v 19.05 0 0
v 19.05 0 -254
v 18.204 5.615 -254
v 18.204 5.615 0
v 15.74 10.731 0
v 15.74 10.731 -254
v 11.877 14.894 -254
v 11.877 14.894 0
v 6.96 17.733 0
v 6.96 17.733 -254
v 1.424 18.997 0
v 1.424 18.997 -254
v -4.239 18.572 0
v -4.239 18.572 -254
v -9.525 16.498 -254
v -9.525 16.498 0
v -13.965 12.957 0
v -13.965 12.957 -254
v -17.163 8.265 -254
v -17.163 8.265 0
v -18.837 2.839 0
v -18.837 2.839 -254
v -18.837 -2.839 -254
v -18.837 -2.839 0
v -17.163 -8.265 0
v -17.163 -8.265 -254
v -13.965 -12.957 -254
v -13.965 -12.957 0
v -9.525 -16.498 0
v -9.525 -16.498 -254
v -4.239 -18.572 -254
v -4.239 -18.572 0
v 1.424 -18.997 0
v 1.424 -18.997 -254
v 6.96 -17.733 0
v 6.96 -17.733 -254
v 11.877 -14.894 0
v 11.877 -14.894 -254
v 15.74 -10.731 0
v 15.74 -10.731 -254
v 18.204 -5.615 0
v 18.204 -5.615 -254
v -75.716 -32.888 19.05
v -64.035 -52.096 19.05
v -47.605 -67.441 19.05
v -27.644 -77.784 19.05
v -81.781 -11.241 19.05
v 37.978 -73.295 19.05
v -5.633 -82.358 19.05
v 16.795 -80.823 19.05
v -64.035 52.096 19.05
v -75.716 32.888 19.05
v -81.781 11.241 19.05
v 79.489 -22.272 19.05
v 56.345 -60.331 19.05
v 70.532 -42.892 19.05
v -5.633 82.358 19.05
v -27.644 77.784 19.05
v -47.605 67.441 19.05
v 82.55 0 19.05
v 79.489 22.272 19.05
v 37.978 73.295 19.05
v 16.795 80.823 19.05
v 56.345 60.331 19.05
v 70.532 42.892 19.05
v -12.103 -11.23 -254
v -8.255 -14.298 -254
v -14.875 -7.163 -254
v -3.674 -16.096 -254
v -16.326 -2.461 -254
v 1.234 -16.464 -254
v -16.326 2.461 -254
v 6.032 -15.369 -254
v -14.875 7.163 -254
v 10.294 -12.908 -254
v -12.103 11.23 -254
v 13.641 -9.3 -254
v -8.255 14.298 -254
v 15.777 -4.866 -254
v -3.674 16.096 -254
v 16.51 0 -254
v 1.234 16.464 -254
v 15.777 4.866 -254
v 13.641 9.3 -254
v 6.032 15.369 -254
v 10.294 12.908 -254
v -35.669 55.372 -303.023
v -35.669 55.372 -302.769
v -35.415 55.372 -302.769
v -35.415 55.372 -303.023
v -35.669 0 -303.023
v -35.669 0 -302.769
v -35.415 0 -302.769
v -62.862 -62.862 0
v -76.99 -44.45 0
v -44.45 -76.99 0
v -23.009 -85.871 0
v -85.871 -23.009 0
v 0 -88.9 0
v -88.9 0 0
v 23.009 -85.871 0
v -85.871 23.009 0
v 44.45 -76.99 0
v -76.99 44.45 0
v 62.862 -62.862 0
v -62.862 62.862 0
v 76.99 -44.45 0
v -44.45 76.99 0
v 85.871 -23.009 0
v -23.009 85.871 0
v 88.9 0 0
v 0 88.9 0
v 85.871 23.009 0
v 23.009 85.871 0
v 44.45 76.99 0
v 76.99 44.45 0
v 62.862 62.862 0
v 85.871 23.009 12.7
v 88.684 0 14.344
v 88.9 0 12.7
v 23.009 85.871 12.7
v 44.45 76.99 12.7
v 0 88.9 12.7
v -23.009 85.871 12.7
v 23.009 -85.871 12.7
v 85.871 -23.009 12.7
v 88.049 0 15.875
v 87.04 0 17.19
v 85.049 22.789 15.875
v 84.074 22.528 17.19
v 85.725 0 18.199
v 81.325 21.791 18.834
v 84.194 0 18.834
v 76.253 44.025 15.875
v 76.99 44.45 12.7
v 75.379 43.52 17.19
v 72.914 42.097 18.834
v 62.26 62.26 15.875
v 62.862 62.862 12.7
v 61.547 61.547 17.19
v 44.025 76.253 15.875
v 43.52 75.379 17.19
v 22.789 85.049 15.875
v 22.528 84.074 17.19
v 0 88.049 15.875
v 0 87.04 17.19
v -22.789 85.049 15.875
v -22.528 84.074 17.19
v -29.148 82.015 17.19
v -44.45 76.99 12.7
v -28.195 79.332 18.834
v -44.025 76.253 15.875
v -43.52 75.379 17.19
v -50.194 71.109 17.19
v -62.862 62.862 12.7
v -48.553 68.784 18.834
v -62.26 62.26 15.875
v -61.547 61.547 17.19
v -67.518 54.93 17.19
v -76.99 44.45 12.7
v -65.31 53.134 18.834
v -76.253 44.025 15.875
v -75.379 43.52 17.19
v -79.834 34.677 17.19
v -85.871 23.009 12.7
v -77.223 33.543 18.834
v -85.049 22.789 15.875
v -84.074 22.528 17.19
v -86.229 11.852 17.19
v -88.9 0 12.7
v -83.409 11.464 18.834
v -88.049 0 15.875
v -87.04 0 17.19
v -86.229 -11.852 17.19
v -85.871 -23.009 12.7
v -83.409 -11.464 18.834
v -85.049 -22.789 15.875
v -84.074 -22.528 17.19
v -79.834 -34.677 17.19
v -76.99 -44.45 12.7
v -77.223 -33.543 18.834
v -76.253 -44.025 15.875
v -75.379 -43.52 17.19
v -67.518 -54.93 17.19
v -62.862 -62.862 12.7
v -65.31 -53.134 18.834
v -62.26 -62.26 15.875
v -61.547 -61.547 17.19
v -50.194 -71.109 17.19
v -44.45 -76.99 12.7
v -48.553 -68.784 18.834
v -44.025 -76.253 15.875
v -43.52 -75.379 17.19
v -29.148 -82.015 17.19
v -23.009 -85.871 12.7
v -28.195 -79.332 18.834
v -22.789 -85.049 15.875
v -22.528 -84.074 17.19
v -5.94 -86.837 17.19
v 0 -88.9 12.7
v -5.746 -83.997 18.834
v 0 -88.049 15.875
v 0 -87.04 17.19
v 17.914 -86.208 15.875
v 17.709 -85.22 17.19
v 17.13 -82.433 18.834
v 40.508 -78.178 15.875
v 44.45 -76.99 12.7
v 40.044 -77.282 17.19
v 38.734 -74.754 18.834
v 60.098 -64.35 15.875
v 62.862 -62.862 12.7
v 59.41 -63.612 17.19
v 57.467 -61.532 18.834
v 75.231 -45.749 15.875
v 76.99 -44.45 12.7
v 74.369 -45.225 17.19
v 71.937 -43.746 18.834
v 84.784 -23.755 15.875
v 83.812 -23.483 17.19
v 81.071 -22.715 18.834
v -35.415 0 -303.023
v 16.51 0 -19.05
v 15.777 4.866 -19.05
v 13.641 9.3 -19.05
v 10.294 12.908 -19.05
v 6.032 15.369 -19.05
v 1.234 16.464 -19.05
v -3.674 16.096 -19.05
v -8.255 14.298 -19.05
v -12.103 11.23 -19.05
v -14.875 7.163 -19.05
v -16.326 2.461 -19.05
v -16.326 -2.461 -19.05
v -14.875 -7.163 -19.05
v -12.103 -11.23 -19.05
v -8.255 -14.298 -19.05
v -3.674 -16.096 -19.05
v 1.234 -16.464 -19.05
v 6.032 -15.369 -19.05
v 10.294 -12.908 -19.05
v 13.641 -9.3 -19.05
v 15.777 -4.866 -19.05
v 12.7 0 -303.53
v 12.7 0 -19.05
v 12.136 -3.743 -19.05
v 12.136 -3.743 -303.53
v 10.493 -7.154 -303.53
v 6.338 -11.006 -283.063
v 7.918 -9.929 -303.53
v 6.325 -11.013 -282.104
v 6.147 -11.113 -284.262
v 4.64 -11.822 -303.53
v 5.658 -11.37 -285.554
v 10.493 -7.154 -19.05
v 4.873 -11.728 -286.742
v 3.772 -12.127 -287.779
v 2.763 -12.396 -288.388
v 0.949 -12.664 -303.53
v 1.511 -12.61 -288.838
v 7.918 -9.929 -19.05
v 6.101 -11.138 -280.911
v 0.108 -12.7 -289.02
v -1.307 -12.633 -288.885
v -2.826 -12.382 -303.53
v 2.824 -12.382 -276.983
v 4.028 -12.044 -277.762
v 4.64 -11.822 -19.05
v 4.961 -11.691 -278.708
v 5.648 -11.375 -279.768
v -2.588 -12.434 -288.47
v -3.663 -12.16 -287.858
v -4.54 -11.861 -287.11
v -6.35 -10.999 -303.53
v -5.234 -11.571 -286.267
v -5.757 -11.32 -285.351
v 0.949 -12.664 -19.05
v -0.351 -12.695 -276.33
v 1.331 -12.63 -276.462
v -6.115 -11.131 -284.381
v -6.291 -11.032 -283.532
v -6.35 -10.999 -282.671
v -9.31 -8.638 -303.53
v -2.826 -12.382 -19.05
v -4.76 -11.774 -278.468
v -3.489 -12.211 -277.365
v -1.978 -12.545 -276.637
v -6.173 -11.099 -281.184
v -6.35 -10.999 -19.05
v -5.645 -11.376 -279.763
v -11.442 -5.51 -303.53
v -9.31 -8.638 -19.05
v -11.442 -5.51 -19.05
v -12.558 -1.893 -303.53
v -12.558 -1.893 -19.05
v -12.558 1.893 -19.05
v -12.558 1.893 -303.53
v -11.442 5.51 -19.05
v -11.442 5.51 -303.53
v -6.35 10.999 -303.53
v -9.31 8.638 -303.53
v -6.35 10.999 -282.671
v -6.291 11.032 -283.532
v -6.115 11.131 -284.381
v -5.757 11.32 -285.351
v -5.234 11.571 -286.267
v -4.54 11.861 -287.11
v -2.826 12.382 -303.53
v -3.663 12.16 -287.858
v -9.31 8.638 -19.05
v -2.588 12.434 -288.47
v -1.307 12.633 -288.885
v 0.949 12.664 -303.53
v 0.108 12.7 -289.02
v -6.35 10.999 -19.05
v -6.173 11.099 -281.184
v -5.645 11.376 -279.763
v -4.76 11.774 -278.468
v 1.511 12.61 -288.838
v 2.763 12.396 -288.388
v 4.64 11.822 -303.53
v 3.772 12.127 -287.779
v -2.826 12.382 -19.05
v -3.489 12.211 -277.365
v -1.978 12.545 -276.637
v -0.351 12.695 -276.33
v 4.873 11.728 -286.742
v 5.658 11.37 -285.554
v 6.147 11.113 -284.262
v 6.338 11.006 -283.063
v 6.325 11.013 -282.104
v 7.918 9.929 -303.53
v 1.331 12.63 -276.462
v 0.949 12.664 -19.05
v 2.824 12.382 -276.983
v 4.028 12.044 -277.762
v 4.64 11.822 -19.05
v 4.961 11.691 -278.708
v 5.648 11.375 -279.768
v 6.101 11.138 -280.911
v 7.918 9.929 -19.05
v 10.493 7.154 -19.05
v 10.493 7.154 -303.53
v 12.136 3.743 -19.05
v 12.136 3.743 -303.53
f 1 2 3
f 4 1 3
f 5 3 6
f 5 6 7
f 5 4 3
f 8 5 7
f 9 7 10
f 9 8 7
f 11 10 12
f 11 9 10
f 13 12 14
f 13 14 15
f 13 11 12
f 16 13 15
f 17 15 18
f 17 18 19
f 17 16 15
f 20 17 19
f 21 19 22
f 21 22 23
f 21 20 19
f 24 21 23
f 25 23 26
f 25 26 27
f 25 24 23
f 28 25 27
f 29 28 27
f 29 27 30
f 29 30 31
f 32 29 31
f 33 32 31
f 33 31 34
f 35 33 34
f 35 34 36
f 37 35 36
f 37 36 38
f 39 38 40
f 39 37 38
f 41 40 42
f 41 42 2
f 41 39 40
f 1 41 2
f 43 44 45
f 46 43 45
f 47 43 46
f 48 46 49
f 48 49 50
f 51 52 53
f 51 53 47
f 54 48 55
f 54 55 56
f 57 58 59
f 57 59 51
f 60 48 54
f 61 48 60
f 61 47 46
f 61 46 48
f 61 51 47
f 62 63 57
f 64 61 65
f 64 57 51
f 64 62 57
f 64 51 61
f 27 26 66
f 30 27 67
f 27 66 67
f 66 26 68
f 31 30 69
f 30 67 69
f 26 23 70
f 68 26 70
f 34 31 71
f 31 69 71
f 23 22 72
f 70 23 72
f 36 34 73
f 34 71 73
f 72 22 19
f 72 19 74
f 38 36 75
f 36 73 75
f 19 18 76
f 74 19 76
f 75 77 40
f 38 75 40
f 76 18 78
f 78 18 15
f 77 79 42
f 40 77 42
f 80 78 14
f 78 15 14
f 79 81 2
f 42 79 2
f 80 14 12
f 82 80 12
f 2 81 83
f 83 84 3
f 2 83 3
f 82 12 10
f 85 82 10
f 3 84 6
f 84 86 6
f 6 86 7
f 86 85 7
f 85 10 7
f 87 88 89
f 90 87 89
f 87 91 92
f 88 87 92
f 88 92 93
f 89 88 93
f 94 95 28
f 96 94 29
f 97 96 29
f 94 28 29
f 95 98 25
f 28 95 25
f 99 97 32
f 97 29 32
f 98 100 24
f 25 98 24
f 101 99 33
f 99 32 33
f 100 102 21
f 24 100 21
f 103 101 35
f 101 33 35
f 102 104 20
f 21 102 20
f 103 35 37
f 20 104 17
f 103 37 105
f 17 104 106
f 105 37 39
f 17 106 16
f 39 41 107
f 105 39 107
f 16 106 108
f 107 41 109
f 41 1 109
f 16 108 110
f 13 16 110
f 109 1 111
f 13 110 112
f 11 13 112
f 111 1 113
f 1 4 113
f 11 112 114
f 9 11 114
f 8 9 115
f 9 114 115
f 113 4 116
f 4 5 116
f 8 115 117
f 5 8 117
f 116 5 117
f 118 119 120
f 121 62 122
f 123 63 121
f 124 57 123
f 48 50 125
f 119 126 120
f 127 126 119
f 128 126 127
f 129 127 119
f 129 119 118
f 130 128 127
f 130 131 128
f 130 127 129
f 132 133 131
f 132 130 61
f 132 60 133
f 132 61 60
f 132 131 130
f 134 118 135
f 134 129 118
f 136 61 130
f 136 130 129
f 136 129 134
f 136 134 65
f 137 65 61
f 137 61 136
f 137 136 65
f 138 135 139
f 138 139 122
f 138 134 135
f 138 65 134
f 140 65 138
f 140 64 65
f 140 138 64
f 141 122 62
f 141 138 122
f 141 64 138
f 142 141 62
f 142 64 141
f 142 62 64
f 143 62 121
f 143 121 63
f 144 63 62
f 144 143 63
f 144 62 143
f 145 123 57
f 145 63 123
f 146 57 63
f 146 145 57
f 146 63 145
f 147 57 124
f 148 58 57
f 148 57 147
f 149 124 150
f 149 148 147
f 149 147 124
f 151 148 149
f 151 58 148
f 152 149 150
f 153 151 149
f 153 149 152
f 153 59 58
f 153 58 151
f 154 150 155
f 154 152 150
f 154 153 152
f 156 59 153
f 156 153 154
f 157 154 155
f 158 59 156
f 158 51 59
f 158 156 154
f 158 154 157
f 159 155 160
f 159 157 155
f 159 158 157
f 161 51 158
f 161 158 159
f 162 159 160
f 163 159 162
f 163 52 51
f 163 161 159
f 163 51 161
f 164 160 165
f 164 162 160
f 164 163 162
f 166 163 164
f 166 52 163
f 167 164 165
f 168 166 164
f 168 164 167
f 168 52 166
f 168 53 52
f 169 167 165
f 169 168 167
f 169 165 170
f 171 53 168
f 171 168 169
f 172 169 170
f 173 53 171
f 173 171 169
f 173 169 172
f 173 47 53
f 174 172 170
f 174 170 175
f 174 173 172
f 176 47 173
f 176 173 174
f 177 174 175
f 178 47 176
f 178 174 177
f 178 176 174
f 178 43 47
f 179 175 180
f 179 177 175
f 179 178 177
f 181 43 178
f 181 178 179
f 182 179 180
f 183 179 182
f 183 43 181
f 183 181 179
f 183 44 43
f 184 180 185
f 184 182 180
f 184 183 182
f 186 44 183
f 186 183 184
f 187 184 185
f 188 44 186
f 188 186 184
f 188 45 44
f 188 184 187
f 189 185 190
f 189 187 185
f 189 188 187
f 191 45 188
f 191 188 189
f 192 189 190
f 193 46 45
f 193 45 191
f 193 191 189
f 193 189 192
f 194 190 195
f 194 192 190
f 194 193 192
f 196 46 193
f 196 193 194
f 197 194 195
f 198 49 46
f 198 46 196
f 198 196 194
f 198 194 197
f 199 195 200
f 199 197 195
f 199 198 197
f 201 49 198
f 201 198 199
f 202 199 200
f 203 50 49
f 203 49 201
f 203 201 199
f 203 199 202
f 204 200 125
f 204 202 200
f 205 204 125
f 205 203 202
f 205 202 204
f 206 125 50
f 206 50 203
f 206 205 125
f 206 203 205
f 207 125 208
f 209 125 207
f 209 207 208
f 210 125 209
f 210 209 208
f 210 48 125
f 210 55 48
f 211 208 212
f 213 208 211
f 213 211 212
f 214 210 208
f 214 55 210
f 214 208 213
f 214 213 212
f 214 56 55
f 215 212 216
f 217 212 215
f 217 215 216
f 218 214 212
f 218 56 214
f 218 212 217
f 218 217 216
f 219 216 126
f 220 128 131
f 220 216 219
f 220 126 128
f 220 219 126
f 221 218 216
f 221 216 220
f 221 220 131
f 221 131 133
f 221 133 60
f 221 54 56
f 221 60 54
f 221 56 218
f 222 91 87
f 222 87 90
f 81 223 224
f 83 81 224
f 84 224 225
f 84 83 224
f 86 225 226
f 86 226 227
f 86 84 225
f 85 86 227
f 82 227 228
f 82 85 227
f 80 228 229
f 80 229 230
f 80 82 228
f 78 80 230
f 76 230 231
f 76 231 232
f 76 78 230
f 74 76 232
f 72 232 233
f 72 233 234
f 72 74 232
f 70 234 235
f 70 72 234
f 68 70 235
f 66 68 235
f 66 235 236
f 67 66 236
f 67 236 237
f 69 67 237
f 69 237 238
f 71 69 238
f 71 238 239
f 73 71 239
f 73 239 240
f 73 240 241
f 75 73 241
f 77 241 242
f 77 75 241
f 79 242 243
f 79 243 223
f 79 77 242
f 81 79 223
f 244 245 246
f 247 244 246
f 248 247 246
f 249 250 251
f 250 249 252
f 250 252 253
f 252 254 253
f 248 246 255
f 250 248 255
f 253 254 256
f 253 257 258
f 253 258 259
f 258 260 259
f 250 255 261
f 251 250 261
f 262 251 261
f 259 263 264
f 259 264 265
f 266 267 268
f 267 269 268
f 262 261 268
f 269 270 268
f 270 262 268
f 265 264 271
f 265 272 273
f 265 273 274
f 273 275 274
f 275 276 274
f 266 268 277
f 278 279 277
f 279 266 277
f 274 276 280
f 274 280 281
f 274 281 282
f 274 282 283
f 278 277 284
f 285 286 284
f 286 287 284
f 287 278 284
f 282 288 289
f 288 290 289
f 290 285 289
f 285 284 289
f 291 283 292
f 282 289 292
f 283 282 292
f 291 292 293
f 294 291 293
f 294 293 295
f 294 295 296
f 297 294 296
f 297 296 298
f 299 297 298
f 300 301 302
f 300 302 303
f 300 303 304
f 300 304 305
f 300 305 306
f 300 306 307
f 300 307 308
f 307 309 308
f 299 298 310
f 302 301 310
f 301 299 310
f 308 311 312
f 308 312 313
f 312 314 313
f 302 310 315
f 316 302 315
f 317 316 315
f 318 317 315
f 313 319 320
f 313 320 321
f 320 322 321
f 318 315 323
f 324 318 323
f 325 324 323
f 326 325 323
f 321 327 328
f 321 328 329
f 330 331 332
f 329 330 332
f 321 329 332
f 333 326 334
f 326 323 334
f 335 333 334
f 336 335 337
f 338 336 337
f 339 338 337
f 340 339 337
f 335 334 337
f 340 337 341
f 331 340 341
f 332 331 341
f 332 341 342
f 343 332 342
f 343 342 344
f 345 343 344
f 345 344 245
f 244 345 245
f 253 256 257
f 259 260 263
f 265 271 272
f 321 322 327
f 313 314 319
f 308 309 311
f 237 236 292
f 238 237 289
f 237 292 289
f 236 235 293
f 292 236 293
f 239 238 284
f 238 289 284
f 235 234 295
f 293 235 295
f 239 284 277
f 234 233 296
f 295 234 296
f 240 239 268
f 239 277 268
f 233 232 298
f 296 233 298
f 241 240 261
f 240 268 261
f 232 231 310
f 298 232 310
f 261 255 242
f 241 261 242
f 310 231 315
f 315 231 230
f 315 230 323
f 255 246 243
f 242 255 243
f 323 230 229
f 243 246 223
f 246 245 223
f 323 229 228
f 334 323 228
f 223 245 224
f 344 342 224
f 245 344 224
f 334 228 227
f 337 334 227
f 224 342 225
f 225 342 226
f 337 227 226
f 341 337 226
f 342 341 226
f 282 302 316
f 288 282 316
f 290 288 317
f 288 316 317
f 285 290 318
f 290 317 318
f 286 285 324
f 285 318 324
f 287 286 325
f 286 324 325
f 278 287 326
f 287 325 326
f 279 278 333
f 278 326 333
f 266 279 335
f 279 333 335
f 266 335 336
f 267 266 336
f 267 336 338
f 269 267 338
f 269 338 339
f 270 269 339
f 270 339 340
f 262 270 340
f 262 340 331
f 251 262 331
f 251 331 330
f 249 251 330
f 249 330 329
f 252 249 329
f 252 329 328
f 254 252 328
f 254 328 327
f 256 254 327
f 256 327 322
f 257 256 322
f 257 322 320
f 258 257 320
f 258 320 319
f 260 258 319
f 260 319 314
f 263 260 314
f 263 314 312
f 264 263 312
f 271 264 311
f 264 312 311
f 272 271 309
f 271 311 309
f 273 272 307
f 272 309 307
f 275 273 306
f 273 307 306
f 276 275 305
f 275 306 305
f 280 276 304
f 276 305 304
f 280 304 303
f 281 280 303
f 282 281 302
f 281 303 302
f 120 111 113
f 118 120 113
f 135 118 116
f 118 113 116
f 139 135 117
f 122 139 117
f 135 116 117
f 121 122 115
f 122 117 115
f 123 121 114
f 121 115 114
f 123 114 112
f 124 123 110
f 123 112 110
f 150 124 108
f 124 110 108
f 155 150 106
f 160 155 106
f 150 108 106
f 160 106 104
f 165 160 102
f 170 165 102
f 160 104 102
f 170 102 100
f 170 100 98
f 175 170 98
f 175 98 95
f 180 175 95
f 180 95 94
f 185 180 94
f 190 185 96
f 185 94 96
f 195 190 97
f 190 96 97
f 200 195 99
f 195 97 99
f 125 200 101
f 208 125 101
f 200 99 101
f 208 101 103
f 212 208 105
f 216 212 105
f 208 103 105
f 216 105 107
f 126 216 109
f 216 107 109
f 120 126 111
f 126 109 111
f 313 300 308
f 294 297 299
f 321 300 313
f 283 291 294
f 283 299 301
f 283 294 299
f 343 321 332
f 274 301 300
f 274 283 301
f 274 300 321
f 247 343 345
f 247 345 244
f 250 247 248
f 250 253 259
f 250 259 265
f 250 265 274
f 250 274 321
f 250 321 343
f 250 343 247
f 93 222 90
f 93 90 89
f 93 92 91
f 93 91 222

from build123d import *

# Parameters (mm, degrees)
F0_R          = 88.9
F0_R_2        = 19.05
F1_DEPTH      = 19.05
F0_R_3        = 16.51
F2_DEPTH      = 254
F2_DEPTH_BACK = 19.05
F3_R          = 6.35
F4_DEPTH      = 19.05
F4_DEPTH_BACK = 19.05
F5_R          = 12.7
F6_DEPTH      = 284.48
F7_W          = 0.254
F7_H          = 0.254
F8_DEPTH      = 55.372
F9_R          = 6.35
F10_DEPTH     = 144.273


with BuildPart() as f1:
    # F0 (on Top) → F1 (new body)
    with BuildSketch(Plane.XY):
        Circle(F0_R)
        Circle(F0_R_2, mode=Mode.SUBTRACT)
    extrude(amount=F1_DEPTH)

    # F0 (on Top) → F2 (join, two sides)
    with BuildSketch(Plane.XY) as f2_sk:
        Circle(F0_R_2)
        Circle(F0_R_3, mode=Mode.SUBTRACT)
    extrude(amount=-F2_DEPTH)
    extrude(f2_sk.sketch, amount=F2_DEPTH_BACK)

    # F3
    f3_edges = [f1.edges().sort_by_distance(p)[0] for p in [
        (-88.9, 0, 19.05),
    ]]
    fillet(f3_edges, radius=F3_R)

    # F0 (on Top) → F4 (join, two sides)
    with BuildSketch(Plane.XY) as f4_sk:
        Circle(F0_R_3)
    extrude(amount=F4_DEPTH)
    extrude(f4_sk.sketch, amount=-F4_DEPTH_BACK)

    # F5 (on face) → F6 (join)
    with BuildSketch(Plane(origin=(0, 0, -19.05), x_dir=(1, 0, 0), z_dir=(0, 0, -1))):
        Circle(F5_R)
    extrude(amount=F6_DEPTH)

    # F9 (on face) → F10 (cut, through all)
    with BuildSketch(Plane(origin=(0, 55.372, 0), x_dir=(-1, 0, 0), z_dir=(0, 1, 0))):
        with Locations((0, -282.6707644518)):
            Circle(F9_R)
    extrude(amount=-F10_DEPTH, mode=Mode.SUBTRACT)


with BuildPart() as f8:
    # F7 (on Front) → F8 (new body)
    with BuildSketch(Plane.XZ):
        with Locations((-35.542425267, -302.8955466426)):
            Rectangle(F7_W, F7_H)
    extrude(amount=-F8_DEPTH)


solid = Compound([f1.part, f8.part])
